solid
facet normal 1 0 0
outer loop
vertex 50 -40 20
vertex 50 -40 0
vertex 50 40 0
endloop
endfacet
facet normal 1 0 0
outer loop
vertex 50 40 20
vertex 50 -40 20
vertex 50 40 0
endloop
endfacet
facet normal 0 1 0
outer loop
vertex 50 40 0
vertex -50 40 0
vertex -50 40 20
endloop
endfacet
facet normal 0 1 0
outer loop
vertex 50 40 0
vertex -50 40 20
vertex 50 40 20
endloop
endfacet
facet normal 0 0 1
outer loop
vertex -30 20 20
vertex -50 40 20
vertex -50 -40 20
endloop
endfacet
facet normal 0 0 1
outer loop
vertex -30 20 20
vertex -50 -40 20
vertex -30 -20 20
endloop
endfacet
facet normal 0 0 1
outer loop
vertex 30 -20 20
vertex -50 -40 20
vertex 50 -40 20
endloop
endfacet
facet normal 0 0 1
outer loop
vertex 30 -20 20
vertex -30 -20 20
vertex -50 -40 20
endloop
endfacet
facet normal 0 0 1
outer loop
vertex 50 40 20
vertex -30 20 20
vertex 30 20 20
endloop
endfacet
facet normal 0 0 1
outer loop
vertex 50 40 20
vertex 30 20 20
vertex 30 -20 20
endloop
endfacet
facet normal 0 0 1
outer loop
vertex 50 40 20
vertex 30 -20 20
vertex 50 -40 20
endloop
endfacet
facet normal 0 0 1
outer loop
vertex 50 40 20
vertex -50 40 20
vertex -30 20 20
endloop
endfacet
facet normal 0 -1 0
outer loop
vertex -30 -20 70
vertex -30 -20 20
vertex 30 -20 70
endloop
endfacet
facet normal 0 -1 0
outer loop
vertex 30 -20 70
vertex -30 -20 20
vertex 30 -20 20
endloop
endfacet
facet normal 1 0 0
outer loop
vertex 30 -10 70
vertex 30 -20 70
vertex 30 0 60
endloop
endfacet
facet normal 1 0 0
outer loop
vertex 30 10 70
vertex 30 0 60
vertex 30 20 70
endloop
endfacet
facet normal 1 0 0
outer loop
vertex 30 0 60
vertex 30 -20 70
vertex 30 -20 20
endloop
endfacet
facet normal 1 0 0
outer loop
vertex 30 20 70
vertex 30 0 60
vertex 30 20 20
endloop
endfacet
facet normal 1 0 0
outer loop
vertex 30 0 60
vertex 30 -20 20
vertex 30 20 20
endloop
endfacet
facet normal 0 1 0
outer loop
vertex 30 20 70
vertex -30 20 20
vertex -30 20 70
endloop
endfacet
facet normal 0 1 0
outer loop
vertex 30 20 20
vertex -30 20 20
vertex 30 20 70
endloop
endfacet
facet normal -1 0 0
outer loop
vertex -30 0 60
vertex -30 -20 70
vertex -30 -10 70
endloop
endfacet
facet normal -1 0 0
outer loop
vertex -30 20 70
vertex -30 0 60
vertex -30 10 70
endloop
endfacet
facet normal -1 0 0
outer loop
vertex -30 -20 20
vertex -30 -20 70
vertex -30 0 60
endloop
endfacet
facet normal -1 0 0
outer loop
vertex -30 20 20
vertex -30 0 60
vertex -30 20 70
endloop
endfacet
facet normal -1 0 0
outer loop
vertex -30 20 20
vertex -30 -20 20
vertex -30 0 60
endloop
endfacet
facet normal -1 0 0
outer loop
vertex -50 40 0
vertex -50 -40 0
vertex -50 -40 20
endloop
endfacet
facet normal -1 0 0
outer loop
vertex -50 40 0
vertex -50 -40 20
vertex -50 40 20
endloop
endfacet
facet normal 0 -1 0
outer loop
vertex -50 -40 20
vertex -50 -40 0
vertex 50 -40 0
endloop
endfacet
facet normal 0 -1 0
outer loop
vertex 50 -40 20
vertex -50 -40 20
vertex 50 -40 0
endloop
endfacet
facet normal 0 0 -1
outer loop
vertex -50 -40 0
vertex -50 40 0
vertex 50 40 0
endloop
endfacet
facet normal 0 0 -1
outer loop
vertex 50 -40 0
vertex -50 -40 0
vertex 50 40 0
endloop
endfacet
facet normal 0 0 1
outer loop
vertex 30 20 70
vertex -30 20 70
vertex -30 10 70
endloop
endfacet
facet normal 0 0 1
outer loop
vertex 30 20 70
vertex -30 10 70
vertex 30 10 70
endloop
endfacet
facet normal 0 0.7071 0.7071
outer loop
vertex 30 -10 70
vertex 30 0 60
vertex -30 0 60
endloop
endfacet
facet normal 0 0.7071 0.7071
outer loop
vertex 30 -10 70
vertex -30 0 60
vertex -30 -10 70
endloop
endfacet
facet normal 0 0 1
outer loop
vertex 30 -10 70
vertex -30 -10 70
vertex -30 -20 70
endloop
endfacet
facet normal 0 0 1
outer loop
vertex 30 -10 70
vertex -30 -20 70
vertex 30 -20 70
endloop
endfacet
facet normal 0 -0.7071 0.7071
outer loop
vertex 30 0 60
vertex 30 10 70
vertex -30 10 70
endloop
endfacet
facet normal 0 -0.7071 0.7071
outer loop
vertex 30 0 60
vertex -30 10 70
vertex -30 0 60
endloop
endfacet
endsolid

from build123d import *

# Parameters (mm, degrees)
F0_W     = 100
F0_H     = 80
F1_DEPTH = 20
F2_W     = 60
F2_H     = 40
F3_DEPTH = 50
F5_DEPTH = 81


with BuildPart() as f1:
    # F0 (on Top) → F1 (new body)
    with BuildSketch(Plane.XY):
        Rectangle(F0_W, F0_H)
    extrude(amount=F1_DEPTH)

    # F2 (on face) → F3 (join)
    with BuildSketch(Plane.XY.offset(20)):
        Rectangle(F2_W, F2_H)
    extrude(amount=F3_DEPTH)

    # F4 (on face) → F5 (cut)
    with BuildSketch(Plane(origin=(-30, 0, 0), x_dir=(0, -1, 0), z_dir=(-1, 0, 0))):
        Polygon((10, 70), (-10, 70), (0, 60), align=None)
    extrude(amount=-F5_DEPTH, mode=Mode.SUBTRACT)


solid = f1.part
